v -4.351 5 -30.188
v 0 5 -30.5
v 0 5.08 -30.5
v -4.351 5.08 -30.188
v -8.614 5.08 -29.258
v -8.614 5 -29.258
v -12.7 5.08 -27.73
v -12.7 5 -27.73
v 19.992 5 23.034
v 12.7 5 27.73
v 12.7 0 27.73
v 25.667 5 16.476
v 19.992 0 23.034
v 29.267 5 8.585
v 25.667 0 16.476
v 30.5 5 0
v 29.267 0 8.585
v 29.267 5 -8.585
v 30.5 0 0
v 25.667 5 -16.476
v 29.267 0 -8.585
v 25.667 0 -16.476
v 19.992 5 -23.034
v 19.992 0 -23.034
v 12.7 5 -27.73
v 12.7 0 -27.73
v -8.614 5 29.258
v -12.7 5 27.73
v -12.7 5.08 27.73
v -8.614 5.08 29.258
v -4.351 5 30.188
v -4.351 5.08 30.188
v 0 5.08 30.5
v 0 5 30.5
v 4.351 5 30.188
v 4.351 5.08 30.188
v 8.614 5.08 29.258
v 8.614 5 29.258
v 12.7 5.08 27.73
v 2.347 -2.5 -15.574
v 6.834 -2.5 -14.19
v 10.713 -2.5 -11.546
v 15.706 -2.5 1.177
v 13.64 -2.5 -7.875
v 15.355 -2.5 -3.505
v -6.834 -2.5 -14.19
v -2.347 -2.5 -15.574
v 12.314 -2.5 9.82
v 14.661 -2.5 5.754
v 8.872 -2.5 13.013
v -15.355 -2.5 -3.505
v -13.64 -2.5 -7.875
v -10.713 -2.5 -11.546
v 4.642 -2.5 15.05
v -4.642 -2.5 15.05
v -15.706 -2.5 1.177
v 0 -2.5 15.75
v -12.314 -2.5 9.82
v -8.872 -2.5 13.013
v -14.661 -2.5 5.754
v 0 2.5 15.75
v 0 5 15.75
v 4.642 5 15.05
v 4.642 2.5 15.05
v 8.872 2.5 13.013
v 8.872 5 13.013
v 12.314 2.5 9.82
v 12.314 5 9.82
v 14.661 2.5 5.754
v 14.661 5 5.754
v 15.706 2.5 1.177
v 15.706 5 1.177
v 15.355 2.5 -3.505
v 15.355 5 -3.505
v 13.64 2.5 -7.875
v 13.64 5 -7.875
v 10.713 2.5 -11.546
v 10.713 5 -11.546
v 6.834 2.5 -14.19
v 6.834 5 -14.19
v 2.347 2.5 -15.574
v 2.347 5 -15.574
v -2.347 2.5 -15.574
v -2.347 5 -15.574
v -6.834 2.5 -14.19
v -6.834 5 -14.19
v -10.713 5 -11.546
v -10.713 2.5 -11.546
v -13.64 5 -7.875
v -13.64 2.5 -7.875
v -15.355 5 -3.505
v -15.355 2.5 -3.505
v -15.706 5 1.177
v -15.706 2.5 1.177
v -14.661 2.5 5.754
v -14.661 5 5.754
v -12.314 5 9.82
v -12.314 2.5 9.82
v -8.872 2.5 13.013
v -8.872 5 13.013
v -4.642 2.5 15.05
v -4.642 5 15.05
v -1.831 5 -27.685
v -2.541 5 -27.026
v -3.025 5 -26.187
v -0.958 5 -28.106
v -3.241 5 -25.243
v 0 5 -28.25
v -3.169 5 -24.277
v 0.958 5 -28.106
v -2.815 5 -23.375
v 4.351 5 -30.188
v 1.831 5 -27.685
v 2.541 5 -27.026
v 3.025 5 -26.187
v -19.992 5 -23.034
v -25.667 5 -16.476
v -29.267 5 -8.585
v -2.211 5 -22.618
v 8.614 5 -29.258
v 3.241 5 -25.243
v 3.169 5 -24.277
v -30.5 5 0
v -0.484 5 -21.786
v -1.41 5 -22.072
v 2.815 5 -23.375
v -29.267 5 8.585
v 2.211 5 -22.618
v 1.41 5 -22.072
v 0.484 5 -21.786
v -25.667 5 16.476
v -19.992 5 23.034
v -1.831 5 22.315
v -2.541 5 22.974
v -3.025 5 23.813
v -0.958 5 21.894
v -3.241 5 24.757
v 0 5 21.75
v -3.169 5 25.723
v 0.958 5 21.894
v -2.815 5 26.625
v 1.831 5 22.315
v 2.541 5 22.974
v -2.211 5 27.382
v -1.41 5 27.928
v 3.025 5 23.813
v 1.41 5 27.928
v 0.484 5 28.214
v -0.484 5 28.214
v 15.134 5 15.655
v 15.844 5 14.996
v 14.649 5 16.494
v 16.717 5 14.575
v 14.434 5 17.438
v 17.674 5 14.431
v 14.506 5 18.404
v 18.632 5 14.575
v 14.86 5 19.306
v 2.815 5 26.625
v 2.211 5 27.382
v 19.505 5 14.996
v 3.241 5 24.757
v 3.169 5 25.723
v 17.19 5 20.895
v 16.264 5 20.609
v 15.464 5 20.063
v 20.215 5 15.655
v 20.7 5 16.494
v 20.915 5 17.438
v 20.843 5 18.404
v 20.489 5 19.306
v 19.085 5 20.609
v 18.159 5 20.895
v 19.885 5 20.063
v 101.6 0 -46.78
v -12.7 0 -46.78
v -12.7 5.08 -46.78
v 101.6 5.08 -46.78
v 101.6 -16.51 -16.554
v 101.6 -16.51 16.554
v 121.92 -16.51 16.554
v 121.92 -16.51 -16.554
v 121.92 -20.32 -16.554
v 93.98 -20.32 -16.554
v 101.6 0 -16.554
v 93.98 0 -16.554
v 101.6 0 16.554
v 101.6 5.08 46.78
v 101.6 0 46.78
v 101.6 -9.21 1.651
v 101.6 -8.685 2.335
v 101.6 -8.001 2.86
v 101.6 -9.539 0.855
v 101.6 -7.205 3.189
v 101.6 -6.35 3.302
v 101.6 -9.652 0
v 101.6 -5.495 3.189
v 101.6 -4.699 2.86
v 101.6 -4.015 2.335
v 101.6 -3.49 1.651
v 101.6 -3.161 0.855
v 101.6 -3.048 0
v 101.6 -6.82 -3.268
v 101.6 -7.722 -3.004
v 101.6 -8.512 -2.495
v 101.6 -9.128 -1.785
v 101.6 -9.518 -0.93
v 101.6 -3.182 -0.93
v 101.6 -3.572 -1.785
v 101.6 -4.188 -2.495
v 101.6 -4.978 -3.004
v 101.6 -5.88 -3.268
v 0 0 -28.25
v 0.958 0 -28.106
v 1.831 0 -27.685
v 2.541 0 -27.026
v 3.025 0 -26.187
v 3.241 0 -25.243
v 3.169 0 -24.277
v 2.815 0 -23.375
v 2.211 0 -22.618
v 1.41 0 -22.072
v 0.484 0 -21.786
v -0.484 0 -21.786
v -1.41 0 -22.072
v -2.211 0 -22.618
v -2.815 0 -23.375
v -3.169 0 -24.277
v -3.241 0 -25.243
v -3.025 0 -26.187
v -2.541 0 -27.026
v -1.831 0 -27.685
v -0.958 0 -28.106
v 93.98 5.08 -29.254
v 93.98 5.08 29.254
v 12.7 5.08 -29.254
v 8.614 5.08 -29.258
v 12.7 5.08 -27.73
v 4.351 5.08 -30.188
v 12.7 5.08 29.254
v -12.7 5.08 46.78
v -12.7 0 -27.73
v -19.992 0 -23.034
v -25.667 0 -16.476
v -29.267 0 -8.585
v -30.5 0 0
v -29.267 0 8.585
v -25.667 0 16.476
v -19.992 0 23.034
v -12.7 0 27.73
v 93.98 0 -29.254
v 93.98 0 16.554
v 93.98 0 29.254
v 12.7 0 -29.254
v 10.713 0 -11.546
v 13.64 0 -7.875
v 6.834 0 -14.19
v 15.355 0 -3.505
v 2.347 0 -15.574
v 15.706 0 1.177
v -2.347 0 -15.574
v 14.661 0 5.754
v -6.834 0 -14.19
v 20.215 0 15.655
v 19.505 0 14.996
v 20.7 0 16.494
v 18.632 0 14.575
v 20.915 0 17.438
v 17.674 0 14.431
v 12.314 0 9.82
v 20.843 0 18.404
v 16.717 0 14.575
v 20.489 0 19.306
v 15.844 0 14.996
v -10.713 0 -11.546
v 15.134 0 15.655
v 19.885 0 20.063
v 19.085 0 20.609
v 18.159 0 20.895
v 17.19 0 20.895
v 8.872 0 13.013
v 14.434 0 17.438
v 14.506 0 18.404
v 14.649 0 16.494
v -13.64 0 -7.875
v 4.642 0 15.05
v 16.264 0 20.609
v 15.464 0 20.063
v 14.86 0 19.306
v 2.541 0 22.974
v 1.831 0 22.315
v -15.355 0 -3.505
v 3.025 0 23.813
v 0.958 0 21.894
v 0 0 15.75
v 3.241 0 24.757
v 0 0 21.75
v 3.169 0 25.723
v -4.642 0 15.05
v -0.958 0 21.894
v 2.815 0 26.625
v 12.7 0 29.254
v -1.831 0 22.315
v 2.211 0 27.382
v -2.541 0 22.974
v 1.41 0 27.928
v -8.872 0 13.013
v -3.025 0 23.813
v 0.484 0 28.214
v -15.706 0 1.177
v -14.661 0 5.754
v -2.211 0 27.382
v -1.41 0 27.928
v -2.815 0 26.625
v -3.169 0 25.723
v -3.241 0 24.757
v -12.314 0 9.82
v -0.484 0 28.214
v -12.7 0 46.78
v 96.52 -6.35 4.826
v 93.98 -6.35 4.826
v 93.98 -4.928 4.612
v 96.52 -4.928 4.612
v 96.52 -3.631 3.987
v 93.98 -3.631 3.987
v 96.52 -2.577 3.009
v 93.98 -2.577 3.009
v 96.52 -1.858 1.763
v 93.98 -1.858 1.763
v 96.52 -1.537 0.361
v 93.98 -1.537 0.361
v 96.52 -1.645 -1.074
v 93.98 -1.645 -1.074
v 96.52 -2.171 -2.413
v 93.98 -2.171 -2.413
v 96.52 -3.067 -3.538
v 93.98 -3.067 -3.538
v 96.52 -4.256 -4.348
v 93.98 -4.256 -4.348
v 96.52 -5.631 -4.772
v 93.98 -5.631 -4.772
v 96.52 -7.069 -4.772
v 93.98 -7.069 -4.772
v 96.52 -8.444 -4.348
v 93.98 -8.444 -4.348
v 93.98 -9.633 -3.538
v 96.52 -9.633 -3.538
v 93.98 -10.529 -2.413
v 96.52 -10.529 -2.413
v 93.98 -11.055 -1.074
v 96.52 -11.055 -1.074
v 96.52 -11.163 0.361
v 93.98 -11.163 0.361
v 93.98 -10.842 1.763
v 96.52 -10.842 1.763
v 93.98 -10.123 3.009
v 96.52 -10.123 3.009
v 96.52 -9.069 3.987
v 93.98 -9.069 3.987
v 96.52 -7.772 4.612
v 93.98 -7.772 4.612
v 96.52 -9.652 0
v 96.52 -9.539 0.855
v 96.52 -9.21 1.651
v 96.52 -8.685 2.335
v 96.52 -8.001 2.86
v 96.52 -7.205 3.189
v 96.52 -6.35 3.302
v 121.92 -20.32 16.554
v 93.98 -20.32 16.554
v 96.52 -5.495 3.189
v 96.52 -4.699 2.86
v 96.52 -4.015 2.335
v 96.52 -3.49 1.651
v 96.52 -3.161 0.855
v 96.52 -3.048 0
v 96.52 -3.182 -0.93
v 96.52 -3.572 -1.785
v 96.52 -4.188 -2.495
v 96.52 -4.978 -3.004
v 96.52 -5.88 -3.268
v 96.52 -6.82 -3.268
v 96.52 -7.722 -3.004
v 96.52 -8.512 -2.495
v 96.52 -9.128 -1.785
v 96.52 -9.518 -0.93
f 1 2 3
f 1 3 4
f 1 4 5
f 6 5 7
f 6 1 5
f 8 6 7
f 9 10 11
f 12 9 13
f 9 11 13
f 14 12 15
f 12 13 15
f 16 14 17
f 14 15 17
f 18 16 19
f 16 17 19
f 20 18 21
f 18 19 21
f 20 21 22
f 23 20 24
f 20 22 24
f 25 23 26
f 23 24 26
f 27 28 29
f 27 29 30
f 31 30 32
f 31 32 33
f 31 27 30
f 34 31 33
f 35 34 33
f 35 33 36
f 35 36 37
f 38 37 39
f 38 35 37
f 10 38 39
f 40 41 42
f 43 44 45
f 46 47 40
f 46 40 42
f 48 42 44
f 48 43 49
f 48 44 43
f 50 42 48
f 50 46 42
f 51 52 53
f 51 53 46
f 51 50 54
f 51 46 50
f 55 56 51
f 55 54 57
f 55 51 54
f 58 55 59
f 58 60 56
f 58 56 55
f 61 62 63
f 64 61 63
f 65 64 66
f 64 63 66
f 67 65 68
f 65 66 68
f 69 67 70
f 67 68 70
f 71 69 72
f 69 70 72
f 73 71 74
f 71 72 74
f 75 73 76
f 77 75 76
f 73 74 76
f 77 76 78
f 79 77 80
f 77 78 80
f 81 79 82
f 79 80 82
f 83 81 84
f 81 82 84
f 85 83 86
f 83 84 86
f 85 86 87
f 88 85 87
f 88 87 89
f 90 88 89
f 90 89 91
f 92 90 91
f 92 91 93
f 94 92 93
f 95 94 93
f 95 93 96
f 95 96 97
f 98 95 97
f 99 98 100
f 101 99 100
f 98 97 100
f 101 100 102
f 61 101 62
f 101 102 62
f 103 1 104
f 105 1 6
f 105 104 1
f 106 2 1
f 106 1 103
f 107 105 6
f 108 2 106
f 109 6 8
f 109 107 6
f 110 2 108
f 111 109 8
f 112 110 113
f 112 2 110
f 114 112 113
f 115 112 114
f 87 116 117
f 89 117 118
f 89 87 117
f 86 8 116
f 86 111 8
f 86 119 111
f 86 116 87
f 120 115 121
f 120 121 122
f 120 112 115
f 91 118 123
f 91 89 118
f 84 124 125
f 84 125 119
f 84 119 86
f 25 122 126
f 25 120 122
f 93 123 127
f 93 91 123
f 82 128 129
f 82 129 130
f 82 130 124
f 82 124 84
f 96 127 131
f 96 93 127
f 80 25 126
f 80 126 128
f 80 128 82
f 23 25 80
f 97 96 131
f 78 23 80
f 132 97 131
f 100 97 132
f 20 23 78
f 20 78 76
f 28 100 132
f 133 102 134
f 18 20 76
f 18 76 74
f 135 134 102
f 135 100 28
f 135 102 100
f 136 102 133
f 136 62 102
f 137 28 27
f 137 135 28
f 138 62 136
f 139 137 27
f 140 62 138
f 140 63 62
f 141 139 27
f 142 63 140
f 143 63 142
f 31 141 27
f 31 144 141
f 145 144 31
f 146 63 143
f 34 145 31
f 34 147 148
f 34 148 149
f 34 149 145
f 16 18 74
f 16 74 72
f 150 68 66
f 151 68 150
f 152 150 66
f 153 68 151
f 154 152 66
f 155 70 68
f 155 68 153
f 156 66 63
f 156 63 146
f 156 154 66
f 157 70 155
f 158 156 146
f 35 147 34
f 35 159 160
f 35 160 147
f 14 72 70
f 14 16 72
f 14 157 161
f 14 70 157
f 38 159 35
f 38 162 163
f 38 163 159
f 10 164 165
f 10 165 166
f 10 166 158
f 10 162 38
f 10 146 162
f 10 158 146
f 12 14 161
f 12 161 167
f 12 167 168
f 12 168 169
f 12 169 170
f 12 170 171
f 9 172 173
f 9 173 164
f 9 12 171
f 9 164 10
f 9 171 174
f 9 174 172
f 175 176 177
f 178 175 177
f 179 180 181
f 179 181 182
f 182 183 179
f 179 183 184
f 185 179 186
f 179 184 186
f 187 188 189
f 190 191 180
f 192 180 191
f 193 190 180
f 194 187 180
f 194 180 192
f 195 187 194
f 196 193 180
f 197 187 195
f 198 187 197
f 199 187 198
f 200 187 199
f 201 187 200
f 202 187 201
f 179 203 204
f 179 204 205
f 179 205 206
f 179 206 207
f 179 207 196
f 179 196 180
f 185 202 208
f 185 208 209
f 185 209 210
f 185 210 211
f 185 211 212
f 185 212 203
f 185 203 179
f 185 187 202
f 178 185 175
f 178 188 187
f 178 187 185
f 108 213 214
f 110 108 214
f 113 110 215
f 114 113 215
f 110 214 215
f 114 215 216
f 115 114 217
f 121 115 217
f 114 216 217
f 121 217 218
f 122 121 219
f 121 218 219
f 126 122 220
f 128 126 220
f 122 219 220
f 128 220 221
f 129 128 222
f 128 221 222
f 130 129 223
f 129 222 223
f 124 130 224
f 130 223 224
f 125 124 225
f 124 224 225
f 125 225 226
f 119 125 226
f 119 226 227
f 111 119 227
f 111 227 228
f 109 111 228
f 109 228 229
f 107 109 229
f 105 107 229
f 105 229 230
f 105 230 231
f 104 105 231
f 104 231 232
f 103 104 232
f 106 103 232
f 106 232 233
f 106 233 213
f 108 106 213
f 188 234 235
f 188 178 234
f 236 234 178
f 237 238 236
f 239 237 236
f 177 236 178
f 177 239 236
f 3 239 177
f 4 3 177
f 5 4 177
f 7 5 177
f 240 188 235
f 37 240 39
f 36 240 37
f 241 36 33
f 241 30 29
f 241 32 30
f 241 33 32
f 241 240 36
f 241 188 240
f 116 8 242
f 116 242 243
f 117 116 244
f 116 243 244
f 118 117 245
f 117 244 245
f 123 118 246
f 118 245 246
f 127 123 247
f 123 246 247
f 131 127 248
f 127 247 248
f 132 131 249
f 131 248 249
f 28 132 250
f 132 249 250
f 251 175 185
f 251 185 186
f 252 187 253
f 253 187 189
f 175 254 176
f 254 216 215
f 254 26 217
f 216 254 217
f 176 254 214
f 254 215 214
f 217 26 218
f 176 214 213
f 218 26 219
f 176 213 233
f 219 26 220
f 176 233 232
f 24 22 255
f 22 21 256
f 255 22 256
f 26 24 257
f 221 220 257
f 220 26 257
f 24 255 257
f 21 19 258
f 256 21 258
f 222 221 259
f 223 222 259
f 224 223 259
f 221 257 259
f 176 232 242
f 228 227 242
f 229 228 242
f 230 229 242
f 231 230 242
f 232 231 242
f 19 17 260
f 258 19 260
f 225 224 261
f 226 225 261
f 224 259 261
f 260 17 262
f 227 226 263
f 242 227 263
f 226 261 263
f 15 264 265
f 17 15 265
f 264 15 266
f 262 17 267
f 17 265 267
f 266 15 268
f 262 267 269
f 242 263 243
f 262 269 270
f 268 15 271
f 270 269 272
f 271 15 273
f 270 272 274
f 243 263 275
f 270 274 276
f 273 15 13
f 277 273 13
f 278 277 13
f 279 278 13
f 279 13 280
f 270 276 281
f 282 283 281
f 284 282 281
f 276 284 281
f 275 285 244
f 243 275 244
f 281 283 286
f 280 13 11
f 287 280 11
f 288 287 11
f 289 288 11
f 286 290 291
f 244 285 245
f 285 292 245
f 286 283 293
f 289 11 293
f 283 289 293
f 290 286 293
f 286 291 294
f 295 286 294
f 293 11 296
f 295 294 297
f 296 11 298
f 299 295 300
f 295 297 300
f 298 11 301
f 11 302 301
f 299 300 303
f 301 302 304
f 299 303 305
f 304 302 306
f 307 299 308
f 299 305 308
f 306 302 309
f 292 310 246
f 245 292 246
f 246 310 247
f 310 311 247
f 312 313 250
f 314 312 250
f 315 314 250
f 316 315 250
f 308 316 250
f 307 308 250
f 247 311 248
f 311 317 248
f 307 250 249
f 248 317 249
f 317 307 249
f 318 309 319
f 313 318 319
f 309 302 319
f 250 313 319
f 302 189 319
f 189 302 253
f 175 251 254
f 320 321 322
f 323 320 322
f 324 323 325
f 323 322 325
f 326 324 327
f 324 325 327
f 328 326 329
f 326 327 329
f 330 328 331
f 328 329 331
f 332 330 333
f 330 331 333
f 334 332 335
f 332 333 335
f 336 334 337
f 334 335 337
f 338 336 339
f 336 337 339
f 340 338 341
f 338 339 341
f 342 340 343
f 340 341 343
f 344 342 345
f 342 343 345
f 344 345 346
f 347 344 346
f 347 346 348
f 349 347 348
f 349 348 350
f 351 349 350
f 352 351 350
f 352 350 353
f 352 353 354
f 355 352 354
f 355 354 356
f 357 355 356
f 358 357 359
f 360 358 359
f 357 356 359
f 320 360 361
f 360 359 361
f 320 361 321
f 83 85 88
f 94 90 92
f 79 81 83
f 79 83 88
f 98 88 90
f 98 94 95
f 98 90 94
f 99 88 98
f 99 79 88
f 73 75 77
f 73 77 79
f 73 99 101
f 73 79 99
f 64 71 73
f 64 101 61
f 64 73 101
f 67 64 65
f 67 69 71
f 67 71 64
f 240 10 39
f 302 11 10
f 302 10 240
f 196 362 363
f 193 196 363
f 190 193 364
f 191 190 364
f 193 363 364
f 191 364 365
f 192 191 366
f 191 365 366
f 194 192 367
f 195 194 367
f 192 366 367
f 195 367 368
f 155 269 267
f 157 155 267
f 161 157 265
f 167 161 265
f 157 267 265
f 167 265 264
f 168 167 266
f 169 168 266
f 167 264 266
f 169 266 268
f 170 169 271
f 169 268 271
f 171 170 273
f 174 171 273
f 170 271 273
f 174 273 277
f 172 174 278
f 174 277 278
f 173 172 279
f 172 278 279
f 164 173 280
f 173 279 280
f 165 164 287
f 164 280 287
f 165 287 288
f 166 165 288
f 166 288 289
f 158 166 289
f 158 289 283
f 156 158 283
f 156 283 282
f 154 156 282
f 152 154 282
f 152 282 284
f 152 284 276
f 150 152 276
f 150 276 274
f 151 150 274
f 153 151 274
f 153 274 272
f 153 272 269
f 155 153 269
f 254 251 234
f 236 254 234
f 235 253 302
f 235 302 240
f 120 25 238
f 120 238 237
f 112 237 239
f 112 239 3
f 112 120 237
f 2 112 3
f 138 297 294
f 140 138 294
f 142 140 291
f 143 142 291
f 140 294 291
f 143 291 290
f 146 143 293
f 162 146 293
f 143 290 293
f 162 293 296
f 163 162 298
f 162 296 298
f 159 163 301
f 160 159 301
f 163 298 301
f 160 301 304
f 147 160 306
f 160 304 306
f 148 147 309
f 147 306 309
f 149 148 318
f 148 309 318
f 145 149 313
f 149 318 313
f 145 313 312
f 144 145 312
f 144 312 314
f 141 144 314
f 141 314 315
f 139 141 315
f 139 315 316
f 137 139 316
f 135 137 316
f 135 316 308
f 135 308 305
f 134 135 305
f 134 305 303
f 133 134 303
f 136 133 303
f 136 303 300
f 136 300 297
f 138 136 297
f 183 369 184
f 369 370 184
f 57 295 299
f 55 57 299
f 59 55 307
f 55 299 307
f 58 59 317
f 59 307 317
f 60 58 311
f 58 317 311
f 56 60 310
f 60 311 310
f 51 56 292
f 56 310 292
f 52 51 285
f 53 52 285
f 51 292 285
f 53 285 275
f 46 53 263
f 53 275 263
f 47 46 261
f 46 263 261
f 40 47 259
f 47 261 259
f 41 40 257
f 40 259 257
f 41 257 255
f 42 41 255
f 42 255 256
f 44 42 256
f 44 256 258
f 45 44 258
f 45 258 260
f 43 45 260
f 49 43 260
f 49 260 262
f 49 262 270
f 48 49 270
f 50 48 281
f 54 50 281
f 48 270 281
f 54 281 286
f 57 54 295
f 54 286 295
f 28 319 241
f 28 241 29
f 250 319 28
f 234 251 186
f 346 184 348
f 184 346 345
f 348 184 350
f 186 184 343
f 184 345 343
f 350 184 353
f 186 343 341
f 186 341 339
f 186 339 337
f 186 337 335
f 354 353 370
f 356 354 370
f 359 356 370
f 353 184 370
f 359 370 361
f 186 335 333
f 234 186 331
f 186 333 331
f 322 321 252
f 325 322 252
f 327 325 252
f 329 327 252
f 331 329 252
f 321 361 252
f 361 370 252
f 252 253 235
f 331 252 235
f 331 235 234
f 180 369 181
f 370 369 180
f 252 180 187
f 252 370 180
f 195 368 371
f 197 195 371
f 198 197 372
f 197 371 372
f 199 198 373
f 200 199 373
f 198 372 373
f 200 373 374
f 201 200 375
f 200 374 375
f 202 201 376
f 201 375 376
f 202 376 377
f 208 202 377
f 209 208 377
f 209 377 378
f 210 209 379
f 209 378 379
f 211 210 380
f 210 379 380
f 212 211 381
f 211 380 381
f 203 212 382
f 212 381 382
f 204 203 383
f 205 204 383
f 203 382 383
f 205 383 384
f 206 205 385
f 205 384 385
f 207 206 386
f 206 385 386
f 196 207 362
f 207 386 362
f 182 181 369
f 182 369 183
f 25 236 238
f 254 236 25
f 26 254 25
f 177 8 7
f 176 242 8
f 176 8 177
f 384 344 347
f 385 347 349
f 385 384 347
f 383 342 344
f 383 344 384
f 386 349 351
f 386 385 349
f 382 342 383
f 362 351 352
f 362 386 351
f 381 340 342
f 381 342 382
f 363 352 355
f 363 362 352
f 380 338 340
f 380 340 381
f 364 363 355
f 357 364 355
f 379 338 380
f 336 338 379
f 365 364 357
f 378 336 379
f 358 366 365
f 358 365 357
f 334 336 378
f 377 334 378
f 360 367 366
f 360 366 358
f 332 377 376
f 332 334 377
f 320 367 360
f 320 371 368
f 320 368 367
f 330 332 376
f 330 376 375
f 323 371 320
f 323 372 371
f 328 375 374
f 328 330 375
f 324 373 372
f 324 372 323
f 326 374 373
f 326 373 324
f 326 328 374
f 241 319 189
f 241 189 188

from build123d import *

# Parameters (mm, degrees)
SKETCH1_R            = 30.5
BOSS_EXTRUDE1_DEPTH  = 5
SKETCH2_R            = 15.75
CUT_EXTRUDE1_DEPTH   = 2.5
SKETCH3_R            = 15.75
BOSS_EXTRUDE2_DEPTH  = 2.5
SKETCH4_R            = 3.25
CUT_EXTRUDE2_DEPTH   = 5.08
SKETCH5_R            = 3.25
CUT_EXTRUDE3_DEPTH   = 5.08
SKETCH6_R            = 3.25
CUT_EXTRUDE4_DEPTH   = 5.08
BOSS_EXTRUDE3_DEPTH  = 5.08
BOSS_EXTRUDE4_DEPTH  = 5.08
SKETCH9_W            = 17.526
SKETCH9_H            = 5.08
BOSS_EXTRUDE5_DEPTH  = 106.68
SKETCH10_W           = 17.526
SKETCH10_H           = 5.08
BOSS_EXTRUDE6_DEPTH  = 106.68
SKETCH11_W           = 25.4
SKETCH11_H           = 5.08
BOSS_EXTRUDE8_DEPTH  = 63.5
SKETCH14_W           = 93.56025604
SKETCH14_H           = 5.08
CUT_EXTRUDE6_DEPTH   = 17.78
SKETCH15_W           = 7.62
SKETCH15_H           = 33.10825604
BOSS_EXTRUDE10_DEPTH = 20.32
SKETCH16_W           = 33.10825604
SKETCH16_H           = 3.81
BOSS_EXTRUDE11_DEPTH = 20.32
CUT_EXTRUDE7_DEPTH   = 7.62
SKETCH18_R           = 4.826
CUT_EXTRUDE8_DEPTH   = 2.54


with BuildPart() as part:
    # Sketch1 → Boss-Extrude1 (new body)
    with BuildSketch(Plane(origin=(0, 0, 0), x_dir=(1, 0, 0), z_dir=(0, 1, 0))):
        with Locations(Location((0, 0, 0), (0, 0, 270))):
            Circle(SKETCH1_R)
    extrude(amount=BOSS_EXTRUDE1_DEPTH)

    # Sketch2 → Cut-Extrude1 (cut)
    with BuildSketch(Plane(origin=(0, 5, 0), x_dir=(1, 0, 0), z_dir=(0, 1, 0))):
        with Locations(Location((0, 0, 0), (0, 0, 270))):
            Circle(SKETCH2_R)
    extrude(amount=-CUT_EXTRUDE1_DEPTH, mode=Mode.SUBTRACT)

    # Sketch3 → Boss-Extrude2 (add)
    with BuildSketch(Plane.XZ):
        with Locations(Location((0, 0, 0), (0, 0, 90))):
            Circle(SKETCH3_R)
    extrude(amount=BOSS_EXTRUDE2_DEPTH)

    # Sketch4 → Cut-Extrude2 (cut)
    with BuildSketch(Plane(origin=(0, 0, 0), x_dir=(-1, 0, 0), z_dir=(0, -1, 0))):
        with Locations(Location((0, 25, 0), (0, 0, 90))):
            Circle(SKETCH4_R)
    extrude(amount=-CUT_EXTRUDE2_DEPTH, mode=Mode.SUBTRACT)

    # Sketch5 → Cut-Extrude3 (cut)
    with BuildSketch(Plane.XZ):
        with Locations(Location((0, 25, 0), (0, 0, 270))):
            Circle(SKETCH5_R)
    extrude(amount=-CUT_EXTRUDE3_DEPTH, mode=Mode.SUBTRACT)

    # Sketch6 → Cut-Extrude4 (cut)
    with BuildSketch(Plane.XZ):
        with Locations(Location((17.674476483, 17.680862, 0), (0, 0, 270))):
            Circle(SKETCH6_R)
    extrude(amount=-CUT_EXTRUDE4_DEPTH, mode=Mode.SUBTRACT)

    # Sketch7 → Boss-Extrude3 (add)
    with BuildSketch(Plane(origin=(0, 0, 0), x_dir=(-1, 0, 0), z_dir=(0, -1, 0))):
        with BuildLine():
            ThreePointArc((12.7, -27.73012802), (6.499272859, -29.79948745), (0, -30.5))
            ThreePointArc((0, -30.5), (-6.499272859, -29.79948745), (-12.7, -27.73012802))
            Line((-12.7, -27.73012802), (-12.7, -46.78012802))
            Line((-12.7, -46.78012802), (12.7, -46.78012802))
            Line((12.7, -46.78012802), (12.7, -27.73012802))
        make_face()
    extrude(amount=-BOSS_EXTRUDE3_DEPTH)

    # Sketch8 → Boss-Extrude4 (add)
    with BuildSketch(Plane.XZ):
        with BuildLine():
            ThreePointArc((0, -30.5), (-6.499272859, -29.79948745), (-12.7, -27.73012802))
            Line((-12.7, -27.73012802), (-12.7, -46.78012802))
            Line((-12.7, -46.78012802), (12.7, -46.78012802))
            Line((12.7, -46.78012802), (12.7, -27.73012802))
            ThreePointArc((12.7, -27.73012802), (6.499272859, -29.79948745), (0, -30.5))
        make_face()
    extrude(amount=-BOSS_EXTRUDE4_DEPTH)

    # Sketch9 → Boss-Extrude5 (add)
    with BuildSketch(Plane(origin=(12.7, 0, 0), x_dir=(0, 0, -1), z_dir=(1, 0, 0))):
        with Locations((38.01712802, 2.54)):
            Rectangle(SKETCH9_W, SKETCH9_H)
    extrude(amount=BOSS_EXTRUDE5_DEPTH)

    # Sketch10 → Boss-Extrude6 (add)
    with BuildSketch(Plane(origin=(12.7, 0, 0), x_dir=(0, 0, -1), z_dir=(1, 0, 0))):
        with Locations((-38.01712802, 2.54)):
            Rectangle(SKETCH10_W, SKETCH10_H)
    extrude(amount=BOSS_EXTRUDE6_DEPTH)

    # Sketch11 → Boss-Extrude8 (add)
    with BuildSketch(Plane(origin=(0, 0, 29.25412802), x_dir=(-1, 0, 0), z_dir=(0, 0, -1))):
        with Locations((-106.68, 2.54)):
            Rectangle(SKETCH11_W, SKETCH11_H)
    extrude(amount=BOSS_EXTRUDE8_DEPTH)

    # Sketch14 → Cut-Extrude6 (cut)
    with BuildSketch(Plane(origin=(119.38, 0, 0), x_dir=(0, 0, -1), z_dir=(1, 0, 0))):
        with Locations((0, 2.54)):
            Rectangle(SKETCH14_W, SKETCH14_H)
    extrude(amount=-CUT_EXTRUDE6_DEPTH, mode=Mode.SUBTRACT)

    # Sketch15 → Boss-Extrude10 (add)
    with BuildSketch(Plane.XZ):
        with Locations((97.79, 0)):
            Rectangle(SKETCH15_W, SKETCH15_H)
    extrude(amount=BOSS_EXTRUDE10_DEPTH)

    # Sketch16 → Boss-Extrude11 (add)
    with BuildSketch(Plane(origin=(101.6, 0, 0), x_dir=(0, 0, -1), z_dir=(1, 0, 0))):
        with Locations((0, -18.415)):
            Rectangle(SKETCH16_W, SKETCH16_H)
    extrude(amount=BOSS_EXTRUDE11_DEPTH)

    # Sketch17 → Cut-Extrude7 (cut)
    with BuildSketch(Plane.ZY.offset(-93.98)):
        with BuildLine():
            ThreePointArc((0, -3.048), (-3.302, -6.35), (0, -9.652))
            Line((0, -9.652), (0, -3.048))
        make_face()
        with BuildLine():
            Line((0, -3.048), (0, -9.652))
            ThreePointArc((0, -9.652), (2.334866591, -8.684866591), (3.302, -6.35))
            ThreePointArc((3.302, -6.35), (2.334866591, -4.015133409), (0, -3.048))
        make_face()
    extrude(amount=-CUT_EXTRUDE7_DEPTH, mode=Mode.SUBTRACT)

    # Sketch18 → Cut-Extrude8 (cut)
    with BuildSketch(Plane.ZY.offset(-93.98)):
        with Locations((0, -6.35)):
            Circle(SKETCH18_R)
    extrude(amount=-CUT_EXTRUDE8_DEPTH, mode=Mode.SUBTRACT)


solid = part.part
